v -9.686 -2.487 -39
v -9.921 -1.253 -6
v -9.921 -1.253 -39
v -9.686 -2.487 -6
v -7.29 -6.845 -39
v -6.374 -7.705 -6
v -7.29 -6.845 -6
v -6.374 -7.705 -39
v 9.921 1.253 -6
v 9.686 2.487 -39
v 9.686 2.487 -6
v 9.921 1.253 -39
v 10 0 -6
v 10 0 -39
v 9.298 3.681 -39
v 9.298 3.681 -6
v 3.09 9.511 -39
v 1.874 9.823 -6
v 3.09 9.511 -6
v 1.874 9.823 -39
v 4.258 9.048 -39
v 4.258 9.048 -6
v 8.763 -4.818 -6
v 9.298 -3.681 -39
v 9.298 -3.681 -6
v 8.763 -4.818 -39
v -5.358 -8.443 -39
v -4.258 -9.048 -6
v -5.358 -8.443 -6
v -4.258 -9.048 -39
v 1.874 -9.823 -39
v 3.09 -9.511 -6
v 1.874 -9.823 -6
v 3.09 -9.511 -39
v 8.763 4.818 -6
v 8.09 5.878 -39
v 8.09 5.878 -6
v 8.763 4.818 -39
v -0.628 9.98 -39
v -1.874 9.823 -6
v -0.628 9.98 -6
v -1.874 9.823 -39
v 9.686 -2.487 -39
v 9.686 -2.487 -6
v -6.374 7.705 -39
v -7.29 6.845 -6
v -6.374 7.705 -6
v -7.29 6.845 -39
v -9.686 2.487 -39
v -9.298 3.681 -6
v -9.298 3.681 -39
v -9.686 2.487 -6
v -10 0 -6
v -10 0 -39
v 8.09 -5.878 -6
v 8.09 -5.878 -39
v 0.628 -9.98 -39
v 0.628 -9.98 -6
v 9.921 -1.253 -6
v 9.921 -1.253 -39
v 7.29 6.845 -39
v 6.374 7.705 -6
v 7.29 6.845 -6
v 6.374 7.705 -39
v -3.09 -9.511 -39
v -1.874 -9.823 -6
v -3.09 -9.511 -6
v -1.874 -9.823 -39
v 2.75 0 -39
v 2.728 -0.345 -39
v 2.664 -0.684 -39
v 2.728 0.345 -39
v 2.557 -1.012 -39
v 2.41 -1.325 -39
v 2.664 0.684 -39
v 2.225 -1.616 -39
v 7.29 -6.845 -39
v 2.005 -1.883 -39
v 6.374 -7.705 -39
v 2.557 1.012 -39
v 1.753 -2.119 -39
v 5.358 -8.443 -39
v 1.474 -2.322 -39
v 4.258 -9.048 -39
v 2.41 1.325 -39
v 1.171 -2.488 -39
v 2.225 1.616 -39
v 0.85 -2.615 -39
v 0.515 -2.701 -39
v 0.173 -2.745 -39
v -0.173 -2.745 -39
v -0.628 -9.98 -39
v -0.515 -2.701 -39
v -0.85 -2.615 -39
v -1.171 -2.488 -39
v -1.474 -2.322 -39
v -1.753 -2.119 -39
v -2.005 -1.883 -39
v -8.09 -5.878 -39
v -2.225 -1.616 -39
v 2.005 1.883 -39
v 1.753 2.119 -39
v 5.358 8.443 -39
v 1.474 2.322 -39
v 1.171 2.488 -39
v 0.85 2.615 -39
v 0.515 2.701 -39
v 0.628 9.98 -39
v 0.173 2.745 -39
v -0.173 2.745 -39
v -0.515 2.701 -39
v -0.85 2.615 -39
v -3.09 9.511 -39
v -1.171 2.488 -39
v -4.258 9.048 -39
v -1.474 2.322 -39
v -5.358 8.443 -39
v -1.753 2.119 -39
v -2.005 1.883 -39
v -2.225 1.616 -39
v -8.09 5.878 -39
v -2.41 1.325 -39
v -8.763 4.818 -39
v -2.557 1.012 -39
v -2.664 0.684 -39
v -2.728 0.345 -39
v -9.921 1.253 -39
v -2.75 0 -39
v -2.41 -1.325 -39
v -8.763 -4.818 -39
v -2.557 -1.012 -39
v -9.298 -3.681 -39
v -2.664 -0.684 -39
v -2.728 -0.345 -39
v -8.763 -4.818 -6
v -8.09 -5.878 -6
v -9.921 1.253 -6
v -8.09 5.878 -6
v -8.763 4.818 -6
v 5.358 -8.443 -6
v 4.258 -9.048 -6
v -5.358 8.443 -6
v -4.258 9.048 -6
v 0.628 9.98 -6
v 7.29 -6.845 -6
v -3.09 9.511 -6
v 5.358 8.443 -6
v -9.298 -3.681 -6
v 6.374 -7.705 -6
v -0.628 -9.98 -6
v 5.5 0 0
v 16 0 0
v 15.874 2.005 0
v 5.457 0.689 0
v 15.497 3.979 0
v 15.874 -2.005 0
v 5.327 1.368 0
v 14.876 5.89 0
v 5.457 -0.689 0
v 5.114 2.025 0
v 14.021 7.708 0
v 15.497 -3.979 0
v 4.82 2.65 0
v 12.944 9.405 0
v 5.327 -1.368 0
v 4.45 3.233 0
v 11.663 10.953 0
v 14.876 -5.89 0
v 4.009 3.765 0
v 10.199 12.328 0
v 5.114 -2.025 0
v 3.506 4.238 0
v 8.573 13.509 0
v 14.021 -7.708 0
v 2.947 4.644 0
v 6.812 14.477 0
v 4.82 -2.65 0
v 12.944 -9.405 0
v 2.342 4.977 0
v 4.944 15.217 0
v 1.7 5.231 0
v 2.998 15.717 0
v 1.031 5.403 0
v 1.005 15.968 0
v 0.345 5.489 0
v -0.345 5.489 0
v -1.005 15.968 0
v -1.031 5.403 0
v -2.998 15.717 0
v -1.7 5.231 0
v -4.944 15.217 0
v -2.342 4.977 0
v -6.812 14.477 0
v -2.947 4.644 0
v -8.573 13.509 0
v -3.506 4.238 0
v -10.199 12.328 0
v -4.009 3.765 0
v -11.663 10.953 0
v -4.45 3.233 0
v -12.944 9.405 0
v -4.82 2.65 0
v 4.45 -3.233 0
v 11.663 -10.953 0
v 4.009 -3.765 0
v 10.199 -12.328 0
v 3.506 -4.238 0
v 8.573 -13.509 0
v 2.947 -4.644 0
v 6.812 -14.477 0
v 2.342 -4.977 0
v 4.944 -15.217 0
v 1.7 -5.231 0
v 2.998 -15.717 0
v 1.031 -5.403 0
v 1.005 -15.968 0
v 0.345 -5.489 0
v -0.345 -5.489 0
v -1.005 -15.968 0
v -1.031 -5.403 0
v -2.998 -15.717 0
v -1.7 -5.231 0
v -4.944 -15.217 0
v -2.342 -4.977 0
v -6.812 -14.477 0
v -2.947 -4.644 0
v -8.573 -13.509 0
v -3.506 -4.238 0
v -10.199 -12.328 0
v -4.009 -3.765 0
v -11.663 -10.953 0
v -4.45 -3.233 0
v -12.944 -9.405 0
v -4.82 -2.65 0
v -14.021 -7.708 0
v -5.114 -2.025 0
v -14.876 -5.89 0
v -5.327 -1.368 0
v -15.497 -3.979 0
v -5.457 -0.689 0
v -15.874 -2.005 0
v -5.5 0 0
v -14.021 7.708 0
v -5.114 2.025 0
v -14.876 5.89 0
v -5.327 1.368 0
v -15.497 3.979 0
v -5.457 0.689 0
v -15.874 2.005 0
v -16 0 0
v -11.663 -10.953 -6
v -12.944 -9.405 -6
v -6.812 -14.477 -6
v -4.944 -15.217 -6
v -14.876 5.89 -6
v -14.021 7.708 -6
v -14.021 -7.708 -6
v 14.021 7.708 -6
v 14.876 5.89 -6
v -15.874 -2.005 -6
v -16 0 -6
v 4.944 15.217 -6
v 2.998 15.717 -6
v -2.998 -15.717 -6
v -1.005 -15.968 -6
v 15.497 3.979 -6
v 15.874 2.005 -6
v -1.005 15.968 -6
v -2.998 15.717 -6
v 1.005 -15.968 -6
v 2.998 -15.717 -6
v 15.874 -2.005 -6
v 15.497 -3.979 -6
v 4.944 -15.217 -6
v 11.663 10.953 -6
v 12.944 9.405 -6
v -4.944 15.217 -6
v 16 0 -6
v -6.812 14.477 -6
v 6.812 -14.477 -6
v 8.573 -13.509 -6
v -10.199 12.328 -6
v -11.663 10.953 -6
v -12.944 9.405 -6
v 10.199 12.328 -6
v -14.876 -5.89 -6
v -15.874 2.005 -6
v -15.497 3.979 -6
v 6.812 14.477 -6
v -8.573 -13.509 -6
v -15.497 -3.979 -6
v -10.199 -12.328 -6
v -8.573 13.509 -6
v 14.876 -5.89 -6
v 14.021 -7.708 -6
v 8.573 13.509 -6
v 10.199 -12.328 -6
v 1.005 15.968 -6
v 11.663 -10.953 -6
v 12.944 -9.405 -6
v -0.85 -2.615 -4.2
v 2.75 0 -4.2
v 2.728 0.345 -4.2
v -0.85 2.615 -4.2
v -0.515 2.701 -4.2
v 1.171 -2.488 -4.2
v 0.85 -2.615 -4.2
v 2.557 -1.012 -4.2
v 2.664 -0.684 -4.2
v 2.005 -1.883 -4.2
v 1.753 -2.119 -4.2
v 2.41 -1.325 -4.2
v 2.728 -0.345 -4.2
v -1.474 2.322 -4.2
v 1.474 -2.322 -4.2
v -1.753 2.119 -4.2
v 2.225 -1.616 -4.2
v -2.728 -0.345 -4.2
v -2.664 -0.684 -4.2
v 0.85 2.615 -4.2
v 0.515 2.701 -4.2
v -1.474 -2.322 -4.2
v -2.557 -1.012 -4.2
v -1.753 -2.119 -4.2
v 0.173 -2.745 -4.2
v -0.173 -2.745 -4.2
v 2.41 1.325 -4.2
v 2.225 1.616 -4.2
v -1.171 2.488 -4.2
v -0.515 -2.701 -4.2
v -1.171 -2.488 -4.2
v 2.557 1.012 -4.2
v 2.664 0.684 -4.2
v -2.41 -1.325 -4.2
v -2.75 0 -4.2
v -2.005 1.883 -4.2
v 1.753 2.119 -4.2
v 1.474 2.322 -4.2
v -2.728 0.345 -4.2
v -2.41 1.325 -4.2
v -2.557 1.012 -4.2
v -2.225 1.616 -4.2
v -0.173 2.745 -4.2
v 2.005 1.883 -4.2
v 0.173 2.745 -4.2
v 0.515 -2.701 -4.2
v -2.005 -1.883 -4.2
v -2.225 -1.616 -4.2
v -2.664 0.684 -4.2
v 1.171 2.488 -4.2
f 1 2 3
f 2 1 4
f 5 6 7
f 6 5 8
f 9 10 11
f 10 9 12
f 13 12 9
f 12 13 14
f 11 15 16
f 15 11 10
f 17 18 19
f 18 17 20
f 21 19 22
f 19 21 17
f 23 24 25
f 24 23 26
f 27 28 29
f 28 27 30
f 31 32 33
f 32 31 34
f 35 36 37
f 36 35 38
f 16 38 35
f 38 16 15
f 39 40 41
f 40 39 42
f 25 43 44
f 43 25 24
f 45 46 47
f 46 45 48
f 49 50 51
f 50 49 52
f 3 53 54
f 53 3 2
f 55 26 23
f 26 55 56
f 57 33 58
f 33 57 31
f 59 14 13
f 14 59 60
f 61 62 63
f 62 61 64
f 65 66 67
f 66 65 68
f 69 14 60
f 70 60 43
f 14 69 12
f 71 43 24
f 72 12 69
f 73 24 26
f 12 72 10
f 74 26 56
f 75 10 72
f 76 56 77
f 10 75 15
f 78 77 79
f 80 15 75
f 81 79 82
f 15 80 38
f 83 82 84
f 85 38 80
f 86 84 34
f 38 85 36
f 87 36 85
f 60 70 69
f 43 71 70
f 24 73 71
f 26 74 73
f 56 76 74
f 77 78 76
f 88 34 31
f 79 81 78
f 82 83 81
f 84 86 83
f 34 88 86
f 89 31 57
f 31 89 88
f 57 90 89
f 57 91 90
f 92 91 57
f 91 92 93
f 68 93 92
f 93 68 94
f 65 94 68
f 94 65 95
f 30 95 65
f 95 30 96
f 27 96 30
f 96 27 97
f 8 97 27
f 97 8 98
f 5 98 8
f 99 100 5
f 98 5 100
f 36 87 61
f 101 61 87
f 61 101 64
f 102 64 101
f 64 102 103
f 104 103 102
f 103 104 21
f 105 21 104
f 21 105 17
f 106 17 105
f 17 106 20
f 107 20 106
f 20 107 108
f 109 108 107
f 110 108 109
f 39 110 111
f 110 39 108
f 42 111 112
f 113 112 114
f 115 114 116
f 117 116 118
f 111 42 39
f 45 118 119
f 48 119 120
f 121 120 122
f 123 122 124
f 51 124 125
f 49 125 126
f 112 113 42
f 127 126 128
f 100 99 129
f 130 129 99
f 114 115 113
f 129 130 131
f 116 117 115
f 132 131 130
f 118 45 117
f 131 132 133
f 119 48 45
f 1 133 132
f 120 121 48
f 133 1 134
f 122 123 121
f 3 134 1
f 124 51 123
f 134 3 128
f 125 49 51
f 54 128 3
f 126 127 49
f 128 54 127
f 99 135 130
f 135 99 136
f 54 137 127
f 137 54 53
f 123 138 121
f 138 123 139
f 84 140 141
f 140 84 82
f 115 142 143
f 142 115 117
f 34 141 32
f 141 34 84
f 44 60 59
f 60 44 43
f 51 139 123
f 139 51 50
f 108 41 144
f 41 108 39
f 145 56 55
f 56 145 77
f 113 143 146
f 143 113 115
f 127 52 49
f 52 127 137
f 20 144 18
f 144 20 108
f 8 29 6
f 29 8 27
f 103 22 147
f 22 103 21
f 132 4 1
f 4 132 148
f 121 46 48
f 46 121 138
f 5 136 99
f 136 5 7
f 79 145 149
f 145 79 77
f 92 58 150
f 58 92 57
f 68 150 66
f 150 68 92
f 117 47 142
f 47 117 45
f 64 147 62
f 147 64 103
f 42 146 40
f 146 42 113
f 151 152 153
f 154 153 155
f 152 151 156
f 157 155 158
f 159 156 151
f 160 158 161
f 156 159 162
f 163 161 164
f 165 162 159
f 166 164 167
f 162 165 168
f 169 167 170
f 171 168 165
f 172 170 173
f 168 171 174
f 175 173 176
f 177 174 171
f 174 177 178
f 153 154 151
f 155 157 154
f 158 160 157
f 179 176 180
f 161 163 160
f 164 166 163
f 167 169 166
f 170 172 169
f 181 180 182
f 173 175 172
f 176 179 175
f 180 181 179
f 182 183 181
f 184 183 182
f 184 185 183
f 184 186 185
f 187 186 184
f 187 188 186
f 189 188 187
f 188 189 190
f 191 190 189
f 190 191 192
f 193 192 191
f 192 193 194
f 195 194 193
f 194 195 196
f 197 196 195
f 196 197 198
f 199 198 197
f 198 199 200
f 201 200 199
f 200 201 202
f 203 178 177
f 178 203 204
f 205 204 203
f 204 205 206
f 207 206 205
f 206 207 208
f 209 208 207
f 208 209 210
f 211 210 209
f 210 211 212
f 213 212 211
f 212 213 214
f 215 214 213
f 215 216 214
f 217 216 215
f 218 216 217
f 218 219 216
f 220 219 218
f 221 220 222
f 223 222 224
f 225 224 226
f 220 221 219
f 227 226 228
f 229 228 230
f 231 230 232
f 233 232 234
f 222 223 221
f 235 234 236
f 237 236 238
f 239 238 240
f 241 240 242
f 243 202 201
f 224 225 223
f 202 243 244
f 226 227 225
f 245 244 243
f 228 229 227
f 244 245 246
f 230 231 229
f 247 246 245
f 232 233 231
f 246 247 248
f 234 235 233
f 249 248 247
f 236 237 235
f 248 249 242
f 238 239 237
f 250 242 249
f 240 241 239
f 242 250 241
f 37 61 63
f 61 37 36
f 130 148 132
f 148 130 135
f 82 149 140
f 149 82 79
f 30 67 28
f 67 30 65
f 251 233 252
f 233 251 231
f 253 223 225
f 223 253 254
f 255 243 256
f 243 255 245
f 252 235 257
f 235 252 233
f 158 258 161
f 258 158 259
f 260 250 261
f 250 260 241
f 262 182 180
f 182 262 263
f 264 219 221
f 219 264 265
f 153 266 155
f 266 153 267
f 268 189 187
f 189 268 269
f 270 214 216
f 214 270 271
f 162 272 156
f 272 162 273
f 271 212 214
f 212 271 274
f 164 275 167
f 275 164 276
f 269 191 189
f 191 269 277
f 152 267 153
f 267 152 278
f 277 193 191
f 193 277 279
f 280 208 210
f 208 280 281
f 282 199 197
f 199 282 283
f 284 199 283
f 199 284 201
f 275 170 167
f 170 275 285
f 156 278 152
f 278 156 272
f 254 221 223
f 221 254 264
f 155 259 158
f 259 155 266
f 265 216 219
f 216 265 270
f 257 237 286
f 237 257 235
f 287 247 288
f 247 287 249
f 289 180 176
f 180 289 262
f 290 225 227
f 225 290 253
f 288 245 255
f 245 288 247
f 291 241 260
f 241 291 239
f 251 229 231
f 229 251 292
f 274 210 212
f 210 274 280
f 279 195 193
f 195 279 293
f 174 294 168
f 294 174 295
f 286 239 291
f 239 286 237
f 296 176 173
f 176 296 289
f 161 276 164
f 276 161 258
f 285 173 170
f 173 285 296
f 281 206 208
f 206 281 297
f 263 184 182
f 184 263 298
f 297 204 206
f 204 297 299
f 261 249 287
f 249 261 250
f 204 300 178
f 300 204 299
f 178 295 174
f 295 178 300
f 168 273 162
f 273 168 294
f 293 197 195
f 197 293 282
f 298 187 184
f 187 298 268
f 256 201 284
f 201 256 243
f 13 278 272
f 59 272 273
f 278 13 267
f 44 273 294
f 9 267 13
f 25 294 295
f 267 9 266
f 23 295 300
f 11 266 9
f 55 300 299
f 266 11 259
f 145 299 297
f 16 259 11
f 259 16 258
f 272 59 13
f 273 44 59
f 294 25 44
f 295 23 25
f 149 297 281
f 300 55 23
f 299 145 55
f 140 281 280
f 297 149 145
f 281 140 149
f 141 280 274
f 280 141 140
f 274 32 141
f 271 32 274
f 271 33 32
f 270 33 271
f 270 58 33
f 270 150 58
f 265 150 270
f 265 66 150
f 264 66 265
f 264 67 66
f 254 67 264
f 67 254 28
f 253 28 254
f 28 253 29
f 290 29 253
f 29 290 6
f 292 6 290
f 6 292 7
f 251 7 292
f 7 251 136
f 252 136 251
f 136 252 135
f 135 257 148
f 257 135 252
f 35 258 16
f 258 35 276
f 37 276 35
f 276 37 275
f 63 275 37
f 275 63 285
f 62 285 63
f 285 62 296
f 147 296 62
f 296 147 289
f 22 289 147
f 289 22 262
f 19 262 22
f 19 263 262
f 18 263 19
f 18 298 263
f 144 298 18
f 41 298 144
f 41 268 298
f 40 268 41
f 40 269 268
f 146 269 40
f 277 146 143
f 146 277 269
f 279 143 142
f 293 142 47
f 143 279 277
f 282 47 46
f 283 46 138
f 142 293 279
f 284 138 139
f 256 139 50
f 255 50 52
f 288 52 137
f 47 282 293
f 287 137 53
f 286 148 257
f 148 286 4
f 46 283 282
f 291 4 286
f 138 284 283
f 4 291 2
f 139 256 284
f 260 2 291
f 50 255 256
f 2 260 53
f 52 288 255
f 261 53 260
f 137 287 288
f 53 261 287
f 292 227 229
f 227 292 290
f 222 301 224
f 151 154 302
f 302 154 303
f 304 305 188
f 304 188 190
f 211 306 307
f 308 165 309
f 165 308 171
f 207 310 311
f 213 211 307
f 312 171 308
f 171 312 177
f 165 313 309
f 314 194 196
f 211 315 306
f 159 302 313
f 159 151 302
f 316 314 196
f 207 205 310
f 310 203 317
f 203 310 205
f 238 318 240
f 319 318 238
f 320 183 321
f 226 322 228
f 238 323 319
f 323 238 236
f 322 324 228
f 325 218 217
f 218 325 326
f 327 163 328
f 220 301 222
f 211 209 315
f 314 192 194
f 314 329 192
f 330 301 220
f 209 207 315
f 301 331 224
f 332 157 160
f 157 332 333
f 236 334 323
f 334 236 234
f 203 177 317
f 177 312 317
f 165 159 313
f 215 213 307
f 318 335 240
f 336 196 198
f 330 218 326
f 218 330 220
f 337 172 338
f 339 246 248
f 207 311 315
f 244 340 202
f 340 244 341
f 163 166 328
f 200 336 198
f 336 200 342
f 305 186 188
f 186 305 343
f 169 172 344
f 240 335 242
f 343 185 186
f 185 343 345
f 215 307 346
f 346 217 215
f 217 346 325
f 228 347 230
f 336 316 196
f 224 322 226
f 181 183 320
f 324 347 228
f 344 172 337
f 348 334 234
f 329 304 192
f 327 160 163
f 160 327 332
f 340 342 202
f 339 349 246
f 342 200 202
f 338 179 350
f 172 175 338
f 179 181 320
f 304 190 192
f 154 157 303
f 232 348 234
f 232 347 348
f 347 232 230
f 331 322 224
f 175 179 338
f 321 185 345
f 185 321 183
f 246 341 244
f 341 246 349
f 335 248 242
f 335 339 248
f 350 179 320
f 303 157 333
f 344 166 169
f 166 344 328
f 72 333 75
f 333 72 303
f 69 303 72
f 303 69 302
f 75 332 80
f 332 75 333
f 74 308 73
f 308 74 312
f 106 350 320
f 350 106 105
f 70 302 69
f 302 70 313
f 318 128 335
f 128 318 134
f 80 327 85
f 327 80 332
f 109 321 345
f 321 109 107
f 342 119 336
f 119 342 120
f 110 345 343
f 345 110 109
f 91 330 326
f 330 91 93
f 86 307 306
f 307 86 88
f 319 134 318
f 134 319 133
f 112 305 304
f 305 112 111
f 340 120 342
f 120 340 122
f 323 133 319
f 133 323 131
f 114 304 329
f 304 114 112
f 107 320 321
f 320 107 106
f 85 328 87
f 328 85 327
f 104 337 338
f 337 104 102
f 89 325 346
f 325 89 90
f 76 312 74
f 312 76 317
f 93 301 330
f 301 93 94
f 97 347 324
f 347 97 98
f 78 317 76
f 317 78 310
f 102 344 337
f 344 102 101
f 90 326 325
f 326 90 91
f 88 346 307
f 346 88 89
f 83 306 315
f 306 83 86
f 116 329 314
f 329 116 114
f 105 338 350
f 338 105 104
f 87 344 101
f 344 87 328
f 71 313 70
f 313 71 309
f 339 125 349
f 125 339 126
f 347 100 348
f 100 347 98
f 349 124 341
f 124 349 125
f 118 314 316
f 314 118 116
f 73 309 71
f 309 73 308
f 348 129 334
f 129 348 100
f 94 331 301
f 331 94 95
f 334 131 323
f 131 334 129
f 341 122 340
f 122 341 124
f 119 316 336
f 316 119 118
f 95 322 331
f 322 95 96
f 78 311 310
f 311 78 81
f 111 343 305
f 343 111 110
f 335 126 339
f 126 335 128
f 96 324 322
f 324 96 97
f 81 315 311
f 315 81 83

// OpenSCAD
$fn = 50;


difference() {
	union() {
		translate(v = [0, 0, -39.0000000000]) {
			cylinder(h = 39, r = 10.0000000000);
		}
		translate(v = [0, 0, -6.0000000000]) {
			cylinder(h = 6, r = 16.0000000000);
		}
	}
	union() {
		translate(v = [0, 0, 0]) {
			rotate(a = [0, 0, 0]) {
				difference() {
					union() {
						#translate(v = [0, 0, -39.0000000000]) {
							cylinder(h = 39, r = 2.2500000000);
						}
						#translate(v = [0, 0, -4.2000000000]) {
							cylinder(h = 4.2000000000, r = 10.0000000000, r1 = 2.7500000000, r2 = 5.5000000000);
						}
						#translate(v = [0, 0, -39.0000000000]) {
							cylinder(h = 39, r = 2.7500000000);
						}
						#translate(v = [0, 0, -39.0000000000]) {
							cylinder(h = 39, r = 2.2500000000);
						}
					}
					union();
				}
			}
		}
	}
}
